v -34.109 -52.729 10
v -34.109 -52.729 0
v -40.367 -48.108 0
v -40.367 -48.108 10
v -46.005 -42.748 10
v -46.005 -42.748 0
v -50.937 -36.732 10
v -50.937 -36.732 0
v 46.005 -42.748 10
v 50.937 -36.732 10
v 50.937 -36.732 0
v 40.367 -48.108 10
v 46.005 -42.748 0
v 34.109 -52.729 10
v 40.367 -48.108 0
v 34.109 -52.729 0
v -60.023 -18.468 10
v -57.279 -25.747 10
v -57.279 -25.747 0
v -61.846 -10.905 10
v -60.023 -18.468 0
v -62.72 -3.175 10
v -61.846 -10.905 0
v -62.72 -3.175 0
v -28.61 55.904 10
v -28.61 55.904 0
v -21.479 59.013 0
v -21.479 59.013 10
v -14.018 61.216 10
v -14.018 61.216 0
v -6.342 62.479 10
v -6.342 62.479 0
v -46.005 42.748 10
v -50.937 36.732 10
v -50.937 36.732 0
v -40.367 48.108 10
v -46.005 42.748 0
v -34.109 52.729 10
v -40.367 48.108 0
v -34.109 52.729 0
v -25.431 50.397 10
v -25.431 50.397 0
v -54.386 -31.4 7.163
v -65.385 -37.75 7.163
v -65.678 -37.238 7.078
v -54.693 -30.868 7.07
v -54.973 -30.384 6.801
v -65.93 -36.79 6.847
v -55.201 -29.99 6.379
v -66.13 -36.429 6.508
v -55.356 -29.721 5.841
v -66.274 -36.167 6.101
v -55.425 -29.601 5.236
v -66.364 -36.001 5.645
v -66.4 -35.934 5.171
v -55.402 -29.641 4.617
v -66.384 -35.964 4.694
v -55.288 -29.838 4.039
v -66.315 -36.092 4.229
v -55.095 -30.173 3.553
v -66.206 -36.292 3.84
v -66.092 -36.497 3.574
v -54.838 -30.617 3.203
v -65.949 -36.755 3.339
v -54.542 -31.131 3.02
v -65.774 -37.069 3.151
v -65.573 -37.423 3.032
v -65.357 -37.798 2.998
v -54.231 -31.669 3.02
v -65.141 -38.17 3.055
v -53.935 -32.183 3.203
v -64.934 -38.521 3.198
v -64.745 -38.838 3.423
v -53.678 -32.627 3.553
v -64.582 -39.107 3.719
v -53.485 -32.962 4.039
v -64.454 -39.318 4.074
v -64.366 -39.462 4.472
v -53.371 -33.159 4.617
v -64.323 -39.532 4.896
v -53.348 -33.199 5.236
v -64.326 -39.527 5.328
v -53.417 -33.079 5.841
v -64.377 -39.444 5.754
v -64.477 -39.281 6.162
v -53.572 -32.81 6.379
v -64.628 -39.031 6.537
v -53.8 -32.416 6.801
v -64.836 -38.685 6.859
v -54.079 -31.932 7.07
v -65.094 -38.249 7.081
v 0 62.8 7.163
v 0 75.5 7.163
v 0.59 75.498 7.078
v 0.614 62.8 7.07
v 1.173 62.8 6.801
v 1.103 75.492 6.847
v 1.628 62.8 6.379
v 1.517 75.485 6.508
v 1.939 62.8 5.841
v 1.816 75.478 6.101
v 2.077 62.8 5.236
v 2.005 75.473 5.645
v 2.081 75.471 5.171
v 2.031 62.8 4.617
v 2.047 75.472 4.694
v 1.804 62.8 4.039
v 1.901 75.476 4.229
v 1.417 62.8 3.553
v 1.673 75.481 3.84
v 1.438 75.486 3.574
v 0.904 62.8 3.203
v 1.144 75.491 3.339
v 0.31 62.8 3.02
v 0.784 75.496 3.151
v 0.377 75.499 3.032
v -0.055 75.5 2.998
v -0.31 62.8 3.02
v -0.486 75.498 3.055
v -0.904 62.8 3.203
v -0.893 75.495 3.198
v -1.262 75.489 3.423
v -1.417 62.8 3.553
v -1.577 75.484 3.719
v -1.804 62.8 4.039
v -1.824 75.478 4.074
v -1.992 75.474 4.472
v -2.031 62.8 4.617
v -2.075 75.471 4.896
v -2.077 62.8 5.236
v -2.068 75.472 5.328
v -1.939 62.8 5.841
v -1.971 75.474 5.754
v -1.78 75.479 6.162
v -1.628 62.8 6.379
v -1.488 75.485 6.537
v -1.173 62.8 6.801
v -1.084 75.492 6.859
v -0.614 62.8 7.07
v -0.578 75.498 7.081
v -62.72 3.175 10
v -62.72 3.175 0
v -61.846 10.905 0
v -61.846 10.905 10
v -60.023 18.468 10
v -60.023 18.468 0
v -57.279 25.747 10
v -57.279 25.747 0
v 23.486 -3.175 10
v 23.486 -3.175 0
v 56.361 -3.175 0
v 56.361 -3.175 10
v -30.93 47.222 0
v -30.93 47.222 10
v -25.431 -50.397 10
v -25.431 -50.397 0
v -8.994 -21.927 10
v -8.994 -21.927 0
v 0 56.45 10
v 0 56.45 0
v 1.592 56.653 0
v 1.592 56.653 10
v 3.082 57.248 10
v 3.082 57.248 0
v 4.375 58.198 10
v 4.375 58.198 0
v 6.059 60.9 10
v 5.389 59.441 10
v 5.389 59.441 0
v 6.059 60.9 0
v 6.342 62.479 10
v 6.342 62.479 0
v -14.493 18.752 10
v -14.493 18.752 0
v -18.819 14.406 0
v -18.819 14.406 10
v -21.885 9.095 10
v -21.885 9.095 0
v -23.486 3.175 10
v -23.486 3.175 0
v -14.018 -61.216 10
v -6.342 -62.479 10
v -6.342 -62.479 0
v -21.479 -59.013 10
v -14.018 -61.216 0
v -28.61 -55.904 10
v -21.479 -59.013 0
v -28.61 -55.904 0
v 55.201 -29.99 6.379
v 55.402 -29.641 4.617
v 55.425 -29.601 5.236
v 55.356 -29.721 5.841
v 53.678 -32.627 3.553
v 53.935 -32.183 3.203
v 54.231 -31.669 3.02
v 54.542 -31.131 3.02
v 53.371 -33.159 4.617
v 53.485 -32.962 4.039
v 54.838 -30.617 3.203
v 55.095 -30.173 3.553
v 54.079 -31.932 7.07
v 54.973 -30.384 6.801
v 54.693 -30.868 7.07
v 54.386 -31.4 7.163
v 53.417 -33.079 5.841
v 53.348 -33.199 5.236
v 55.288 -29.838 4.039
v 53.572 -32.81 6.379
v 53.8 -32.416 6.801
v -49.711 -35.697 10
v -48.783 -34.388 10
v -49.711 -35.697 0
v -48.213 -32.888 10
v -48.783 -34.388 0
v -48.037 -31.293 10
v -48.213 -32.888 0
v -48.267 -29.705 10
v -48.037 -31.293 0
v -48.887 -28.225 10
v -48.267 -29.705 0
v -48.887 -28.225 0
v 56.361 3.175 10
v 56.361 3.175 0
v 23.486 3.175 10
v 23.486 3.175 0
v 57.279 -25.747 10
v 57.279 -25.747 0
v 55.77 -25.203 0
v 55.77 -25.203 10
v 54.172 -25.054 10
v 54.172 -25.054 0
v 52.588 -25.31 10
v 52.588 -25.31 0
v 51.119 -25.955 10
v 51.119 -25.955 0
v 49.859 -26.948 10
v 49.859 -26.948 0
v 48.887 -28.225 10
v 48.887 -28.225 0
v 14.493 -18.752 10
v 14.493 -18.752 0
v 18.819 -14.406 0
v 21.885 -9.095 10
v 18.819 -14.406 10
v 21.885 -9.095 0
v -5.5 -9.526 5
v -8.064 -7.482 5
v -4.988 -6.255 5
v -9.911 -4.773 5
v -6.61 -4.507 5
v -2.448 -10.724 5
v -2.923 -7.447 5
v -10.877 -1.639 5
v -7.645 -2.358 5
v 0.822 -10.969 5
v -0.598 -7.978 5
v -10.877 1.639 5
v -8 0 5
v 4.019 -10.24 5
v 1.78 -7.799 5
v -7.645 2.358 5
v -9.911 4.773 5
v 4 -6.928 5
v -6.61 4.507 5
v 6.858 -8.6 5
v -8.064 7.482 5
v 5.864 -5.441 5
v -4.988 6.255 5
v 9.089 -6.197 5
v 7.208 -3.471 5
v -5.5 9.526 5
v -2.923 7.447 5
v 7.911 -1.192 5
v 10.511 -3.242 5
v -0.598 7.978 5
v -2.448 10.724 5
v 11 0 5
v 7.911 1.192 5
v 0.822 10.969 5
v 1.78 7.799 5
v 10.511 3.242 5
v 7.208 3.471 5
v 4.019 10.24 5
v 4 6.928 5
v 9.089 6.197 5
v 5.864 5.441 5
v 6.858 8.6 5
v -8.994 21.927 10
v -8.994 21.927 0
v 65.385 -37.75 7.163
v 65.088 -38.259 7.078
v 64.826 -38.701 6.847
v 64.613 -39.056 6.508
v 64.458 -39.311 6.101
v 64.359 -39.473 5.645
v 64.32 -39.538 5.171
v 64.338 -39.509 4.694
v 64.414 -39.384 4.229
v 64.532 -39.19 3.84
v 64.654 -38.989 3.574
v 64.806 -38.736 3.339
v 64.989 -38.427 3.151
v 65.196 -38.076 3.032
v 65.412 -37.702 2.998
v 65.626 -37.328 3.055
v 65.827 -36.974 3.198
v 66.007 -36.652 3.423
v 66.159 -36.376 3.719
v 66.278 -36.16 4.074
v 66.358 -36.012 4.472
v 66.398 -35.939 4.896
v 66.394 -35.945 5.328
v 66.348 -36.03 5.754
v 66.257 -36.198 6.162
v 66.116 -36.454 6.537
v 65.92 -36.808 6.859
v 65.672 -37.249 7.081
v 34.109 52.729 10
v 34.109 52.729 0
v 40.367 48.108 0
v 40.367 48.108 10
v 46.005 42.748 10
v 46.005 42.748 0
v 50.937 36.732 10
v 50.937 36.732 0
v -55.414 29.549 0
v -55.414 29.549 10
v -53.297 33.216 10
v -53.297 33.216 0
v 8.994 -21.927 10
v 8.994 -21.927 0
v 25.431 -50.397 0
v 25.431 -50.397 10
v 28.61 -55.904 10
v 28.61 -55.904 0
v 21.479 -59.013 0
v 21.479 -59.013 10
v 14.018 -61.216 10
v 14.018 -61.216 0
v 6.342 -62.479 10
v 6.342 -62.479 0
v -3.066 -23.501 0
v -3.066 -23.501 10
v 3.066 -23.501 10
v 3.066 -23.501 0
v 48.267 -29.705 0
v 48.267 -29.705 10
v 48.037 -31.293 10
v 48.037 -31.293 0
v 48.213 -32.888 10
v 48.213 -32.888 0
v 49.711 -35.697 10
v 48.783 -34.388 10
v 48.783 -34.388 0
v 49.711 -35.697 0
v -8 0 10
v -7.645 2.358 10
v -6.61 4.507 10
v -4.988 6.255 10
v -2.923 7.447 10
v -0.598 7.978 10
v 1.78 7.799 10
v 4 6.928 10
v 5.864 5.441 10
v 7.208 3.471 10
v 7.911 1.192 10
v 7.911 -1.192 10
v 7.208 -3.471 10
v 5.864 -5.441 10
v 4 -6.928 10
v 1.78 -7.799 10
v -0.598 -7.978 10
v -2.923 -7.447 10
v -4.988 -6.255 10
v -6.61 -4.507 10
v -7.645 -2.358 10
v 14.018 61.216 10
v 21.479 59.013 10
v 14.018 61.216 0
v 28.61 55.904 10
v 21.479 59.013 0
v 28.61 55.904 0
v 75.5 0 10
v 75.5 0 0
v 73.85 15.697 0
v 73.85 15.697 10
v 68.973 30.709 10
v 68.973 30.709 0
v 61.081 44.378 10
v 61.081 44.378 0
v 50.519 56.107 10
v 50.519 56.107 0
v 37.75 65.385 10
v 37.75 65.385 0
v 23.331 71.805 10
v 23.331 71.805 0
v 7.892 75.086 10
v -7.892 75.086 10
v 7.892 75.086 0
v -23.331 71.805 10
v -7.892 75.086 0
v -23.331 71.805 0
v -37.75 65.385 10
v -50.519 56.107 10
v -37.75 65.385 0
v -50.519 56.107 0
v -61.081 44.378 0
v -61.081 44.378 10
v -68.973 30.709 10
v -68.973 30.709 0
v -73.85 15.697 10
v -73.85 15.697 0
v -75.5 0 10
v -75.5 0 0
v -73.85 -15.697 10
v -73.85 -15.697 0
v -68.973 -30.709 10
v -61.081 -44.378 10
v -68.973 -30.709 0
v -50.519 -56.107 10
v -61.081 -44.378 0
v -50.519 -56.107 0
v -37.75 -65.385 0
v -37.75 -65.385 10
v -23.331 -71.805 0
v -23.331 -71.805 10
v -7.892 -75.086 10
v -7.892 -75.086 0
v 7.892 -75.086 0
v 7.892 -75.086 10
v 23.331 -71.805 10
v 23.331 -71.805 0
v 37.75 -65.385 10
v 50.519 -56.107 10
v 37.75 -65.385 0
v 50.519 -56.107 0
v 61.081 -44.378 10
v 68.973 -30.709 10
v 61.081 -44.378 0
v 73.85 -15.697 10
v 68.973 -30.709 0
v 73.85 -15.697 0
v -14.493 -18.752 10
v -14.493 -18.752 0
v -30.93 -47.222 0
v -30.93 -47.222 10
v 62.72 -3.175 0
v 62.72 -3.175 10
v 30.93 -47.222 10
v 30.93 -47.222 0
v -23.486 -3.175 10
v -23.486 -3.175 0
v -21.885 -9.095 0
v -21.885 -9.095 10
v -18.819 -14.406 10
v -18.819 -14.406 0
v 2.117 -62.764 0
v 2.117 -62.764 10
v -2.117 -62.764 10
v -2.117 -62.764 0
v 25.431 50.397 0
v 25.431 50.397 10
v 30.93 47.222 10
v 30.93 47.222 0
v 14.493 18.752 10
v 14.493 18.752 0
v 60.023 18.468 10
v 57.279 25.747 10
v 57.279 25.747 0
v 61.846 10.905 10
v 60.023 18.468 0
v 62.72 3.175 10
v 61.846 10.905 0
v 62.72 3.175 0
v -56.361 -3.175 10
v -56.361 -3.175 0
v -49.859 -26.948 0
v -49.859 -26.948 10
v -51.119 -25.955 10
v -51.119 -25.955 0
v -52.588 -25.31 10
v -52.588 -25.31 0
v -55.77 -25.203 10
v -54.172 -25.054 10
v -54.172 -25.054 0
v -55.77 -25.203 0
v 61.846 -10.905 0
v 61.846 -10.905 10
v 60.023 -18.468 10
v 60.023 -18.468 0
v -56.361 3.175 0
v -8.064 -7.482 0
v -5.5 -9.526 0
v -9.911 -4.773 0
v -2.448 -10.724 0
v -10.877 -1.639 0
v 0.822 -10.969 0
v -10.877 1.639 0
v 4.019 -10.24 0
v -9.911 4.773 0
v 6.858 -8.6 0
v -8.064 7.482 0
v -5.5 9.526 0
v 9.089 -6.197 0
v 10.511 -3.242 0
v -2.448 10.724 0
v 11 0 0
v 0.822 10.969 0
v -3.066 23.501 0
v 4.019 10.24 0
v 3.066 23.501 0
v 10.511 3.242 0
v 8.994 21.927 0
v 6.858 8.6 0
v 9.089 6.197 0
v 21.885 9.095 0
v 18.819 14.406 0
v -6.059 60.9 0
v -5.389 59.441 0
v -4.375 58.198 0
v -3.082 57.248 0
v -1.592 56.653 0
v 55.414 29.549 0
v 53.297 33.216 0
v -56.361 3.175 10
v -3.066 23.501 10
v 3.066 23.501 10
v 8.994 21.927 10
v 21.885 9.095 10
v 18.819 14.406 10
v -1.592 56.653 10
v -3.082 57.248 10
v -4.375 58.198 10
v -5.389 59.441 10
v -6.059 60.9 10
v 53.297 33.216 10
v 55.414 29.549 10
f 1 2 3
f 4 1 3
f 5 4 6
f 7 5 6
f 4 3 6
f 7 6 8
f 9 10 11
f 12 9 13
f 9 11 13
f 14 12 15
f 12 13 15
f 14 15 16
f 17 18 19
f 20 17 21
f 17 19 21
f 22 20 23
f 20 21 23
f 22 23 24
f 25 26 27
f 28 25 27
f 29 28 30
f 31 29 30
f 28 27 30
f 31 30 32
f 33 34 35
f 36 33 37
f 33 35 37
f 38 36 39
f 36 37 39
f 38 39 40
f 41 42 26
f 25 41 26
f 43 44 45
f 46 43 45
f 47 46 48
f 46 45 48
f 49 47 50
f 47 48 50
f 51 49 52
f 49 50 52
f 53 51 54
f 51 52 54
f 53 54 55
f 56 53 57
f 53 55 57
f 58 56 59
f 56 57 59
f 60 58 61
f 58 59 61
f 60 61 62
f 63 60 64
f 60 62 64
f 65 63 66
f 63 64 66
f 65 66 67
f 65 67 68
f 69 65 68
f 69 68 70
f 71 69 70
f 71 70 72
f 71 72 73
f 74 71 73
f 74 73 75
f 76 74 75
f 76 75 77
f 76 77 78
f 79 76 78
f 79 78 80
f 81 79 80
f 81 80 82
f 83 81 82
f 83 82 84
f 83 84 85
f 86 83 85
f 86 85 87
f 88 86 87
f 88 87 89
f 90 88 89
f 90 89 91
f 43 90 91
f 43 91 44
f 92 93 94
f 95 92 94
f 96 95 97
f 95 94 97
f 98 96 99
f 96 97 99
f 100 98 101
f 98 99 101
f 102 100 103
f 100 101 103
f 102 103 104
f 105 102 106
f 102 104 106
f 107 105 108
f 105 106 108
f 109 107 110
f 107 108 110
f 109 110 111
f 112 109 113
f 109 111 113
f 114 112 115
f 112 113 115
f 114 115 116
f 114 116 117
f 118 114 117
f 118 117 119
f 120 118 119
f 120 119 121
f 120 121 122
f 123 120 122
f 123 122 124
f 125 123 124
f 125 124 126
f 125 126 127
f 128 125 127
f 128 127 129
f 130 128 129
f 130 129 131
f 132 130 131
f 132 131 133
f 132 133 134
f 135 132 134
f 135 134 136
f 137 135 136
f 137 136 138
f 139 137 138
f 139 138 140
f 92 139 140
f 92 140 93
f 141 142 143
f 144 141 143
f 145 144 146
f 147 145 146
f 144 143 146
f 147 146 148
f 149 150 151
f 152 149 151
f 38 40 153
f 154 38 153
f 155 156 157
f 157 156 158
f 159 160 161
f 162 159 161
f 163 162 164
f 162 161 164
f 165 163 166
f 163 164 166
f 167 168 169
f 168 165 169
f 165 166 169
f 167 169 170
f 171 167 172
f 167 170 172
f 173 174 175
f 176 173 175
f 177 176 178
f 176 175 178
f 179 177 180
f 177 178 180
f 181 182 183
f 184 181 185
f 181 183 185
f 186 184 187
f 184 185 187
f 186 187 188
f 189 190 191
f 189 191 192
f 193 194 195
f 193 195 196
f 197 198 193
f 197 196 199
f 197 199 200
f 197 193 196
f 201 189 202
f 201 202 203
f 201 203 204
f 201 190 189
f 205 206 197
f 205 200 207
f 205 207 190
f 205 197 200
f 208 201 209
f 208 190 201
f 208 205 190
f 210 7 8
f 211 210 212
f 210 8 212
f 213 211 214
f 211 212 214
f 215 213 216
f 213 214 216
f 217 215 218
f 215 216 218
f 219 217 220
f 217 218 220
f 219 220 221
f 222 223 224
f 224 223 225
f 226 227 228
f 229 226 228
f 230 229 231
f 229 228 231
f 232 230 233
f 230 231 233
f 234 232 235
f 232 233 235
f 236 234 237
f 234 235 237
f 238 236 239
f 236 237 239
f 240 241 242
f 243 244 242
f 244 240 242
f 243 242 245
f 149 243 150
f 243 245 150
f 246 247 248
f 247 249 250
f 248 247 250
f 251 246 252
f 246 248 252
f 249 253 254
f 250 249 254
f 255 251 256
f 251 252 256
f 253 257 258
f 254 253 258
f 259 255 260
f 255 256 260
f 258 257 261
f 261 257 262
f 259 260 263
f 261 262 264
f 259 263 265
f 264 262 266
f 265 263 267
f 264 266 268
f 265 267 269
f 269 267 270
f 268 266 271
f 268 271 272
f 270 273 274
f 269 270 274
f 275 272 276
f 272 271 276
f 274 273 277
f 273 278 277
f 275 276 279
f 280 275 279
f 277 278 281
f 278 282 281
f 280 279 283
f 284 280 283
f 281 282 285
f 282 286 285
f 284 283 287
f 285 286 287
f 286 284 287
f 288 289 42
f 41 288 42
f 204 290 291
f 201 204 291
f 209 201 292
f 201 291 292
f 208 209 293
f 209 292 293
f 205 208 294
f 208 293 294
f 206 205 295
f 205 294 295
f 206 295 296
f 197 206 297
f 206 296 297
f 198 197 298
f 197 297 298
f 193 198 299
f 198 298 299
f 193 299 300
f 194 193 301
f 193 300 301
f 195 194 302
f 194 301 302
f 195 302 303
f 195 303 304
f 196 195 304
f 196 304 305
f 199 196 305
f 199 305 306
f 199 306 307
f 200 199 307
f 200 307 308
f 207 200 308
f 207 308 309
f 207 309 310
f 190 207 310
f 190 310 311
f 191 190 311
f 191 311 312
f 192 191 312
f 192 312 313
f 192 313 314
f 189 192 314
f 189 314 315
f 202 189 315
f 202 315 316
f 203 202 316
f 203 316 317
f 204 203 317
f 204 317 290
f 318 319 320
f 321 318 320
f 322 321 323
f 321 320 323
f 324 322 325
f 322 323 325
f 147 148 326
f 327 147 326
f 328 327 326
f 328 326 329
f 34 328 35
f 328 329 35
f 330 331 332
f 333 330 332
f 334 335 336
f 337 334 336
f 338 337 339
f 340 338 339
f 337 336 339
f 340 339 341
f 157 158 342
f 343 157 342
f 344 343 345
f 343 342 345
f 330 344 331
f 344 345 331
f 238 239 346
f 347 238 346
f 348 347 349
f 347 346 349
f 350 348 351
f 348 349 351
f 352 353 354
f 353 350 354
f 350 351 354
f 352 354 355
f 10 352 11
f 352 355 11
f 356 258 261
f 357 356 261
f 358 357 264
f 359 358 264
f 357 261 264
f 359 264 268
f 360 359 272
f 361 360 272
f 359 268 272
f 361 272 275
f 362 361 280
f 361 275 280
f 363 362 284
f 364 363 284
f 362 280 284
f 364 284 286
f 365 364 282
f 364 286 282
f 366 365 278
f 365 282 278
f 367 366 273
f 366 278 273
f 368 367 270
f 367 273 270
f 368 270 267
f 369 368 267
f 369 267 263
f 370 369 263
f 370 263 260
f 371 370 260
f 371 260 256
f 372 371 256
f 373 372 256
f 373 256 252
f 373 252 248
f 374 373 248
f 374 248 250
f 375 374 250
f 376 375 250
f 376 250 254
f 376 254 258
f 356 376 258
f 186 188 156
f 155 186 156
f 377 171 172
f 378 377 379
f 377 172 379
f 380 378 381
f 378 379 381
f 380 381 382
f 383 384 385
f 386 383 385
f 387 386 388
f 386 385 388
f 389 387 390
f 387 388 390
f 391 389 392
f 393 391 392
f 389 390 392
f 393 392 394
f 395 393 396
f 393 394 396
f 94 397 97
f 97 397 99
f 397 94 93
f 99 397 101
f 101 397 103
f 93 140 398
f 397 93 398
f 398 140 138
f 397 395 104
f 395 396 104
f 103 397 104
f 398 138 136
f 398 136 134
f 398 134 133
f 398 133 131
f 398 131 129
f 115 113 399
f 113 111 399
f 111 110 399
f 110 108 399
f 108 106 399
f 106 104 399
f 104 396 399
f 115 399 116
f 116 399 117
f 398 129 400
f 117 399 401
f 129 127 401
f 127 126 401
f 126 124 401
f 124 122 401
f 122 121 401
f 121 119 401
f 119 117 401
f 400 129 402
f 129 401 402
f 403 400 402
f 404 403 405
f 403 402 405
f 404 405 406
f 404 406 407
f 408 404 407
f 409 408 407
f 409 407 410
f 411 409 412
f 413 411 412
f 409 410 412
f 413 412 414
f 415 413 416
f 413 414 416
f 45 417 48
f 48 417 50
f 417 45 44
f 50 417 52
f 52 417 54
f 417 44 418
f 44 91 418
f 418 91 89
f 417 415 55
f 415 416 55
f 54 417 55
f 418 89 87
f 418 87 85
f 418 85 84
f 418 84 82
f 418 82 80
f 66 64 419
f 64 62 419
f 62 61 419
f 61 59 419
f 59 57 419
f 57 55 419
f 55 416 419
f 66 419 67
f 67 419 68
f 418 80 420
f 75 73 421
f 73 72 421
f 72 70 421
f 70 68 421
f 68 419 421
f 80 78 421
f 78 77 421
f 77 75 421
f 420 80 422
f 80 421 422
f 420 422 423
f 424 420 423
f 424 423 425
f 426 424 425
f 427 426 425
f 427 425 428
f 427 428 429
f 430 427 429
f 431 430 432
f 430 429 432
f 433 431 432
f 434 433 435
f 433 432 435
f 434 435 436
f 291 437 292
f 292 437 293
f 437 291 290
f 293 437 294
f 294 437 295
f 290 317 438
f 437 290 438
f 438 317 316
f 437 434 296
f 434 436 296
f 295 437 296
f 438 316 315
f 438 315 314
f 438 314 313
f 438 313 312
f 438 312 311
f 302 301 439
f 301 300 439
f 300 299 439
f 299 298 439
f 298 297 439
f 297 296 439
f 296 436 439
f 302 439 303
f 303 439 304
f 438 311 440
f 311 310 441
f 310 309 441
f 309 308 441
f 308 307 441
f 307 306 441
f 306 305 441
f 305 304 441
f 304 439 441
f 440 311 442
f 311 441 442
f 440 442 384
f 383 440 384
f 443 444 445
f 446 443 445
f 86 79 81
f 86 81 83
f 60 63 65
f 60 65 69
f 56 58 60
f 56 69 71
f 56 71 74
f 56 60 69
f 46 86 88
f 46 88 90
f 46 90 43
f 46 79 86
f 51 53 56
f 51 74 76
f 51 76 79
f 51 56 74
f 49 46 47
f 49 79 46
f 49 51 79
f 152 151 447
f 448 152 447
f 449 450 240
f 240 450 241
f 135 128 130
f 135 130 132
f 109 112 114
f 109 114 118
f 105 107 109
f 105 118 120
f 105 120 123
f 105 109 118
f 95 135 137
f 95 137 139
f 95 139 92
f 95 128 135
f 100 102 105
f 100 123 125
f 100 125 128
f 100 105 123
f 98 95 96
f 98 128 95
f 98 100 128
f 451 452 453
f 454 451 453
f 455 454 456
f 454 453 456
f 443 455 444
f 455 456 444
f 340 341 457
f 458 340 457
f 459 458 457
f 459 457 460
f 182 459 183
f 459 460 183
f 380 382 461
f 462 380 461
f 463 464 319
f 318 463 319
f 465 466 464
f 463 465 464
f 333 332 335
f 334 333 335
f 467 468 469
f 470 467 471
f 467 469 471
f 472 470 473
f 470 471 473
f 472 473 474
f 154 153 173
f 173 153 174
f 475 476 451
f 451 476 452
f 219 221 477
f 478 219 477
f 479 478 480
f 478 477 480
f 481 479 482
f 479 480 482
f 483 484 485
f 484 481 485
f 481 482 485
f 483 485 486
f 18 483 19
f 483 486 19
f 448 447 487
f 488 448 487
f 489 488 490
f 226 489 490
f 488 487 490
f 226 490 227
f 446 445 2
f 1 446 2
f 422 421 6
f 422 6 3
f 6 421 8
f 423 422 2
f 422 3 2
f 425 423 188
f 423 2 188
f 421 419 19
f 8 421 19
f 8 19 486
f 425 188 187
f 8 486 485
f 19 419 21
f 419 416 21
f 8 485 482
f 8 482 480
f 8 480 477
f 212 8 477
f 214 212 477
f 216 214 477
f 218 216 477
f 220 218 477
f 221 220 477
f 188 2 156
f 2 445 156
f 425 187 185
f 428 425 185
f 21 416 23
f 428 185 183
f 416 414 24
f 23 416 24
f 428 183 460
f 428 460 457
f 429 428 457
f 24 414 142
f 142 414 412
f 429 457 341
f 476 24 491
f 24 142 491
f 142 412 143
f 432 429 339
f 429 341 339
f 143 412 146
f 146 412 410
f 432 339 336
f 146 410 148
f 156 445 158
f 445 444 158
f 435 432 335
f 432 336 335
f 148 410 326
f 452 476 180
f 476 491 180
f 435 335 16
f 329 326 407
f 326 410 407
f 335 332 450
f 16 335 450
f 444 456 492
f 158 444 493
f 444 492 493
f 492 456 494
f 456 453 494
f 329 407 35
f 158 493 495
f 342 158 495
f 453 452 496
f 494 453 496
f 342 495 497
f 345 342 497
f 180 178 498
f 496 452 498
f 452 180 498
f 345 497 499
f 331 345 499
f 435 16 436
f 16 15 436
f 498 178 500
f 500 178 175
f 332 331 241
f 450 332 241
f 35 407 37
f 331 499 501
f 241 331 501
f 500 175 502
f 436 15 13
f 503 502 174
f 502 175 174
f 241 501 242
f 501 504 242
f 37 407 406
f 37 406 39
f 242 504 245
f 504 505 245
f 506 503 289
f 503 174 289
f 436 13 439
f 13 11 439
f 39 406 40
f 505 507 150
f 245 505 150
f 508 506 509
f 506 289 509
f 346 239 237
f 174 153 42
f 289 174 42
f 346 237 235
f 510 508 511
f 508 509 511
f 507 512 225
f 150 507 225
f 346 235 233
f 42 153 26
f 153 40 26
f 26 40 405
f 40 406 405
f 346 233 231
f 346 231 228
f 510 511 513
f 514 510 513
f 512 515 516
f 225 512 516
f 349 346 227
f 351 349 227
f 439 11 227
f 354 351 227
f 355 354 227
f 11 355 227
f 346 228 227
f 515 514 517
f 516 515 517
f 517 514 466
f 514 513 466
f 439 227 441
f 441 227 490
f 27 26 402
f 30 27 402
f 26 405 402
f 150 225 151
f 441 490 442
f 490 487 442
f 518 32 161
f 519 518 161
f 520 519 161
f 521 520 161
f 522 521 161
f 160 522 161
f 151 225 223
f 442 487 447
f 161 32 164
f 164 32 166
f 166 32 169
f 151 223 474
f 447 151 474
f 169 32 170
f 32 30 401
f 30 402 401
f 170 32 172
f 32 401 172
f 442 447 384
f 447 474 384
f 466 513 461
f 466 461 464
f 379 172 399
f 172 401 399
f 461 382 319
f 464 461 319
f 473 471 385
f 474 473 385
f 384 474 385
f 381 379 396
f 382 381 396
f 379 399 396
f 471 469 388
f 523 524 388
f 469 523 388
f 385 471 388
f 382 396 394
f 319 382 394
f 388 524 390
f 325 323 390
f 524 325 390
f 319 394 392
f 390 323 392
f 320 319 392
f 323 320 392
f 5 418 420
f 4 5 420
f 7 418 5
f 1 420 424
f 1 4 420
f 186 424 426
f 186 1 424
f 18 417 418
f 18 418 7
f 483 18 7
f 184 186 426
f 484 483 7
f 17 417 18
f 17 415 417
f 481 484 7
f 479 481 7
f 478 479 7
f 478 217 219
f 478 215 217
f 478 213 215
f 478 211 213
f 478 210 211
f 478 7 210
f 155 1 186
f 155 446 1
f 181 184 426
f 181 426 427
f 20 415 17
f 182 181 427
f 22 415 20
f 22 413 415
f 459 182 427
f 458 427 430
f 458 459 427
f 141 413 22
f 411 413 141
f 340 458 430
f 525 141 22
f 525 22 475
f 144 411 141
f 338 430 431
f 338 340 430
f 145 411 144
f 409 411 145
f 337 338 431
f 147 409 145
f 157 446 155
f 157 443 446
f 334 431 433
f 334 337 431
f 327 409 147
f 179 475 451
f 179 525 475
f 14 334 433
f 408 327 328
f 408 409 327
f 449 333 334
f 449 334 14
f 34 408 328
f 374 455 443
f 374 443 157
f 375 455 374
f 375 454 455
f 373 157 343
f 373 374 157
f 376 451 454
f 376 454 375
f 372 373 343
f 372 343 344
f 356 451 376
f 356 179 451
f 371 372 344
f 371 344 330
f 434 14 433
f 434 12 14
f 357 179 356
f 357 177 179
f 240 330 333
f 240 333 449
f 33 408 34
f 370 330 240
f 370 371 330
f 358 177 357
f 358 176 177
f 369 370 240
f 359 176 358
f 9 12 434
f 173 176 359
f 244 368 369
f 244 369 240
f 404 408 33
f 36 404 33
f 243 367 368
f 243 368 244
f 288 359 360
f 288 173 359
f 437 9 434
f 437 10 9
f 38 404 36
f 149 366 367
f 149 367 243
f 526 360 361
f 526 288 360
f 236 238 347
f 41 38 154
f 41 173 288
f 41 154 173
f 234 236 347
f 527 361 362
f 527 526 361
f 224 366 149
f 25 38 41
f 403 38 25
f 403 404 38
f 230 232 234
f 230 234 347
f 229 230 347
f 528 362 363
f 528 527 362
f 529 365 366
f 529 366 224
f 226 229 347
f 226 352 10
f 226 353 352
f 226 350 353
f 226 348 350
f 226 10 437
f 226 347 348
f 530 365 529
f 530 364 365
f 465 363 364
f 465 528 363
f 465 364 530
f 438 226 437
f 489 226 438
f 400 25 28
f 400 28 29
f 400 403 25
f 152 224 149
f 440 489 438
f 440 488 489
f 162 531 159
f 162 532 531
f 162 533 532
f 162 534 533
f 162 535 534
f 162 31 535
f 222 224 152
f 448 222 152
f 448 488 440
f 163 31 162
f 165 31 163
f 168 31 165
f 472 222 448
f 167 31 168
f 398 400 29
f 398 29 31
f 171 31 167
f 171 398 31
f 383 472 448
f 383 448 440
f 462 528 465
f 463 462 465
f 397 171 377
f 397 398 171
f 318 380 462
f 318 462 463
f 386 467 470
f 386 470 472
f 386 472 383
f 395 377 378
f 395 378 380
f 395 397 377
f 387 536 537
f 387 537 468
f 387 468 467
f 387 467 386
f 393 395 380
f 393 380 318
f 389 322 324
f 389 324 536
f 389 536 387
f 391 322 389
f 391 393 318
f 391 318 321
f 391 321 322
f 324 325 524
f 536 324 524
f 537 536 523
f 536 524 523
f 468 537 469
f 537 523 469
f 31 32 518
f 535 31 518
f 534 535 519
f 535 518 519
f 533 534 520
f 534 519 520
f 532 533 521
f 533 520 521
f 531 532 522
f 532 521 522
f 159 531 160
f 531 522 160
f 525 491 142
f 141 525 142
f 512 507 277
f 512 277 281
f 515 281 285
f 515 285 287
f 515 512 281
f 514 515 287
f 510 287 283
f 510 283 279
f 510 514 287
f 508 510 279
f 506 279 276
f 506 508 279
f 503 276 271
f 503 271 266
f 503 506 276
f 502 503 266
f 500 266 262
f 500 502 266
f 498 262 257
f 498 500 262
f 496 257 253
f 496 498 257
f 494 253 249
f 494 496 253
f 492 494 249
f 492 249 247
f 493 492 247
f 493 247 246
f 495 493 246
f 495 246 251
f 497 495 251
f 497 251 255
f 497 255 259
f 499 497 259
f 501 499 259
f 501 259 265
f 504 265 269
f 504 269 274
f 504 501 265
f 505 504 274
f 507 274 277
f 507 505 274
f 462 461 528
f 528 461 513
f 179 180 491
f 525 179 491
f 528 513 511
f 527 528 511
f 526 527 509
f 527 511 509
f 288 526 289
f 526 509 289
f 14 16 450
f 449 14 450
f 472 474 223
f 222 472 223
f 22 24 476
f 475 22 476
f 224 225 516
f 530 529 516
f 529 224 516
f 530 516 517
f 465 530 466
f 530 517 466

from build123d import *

# Parameters (mm, degrees)
SKETCH1_R           = 75.5
BOSS_EXTRUDE1_DEPTH = 10
CUT_EXTRUDE1_START  = -10
SKETCH2_R           = 11
CUT_EXTRUDE1_DEPTH  = 5
SKETCH3_R           = 8
CUT_EXTRUDE2_DEPTH  = 107.890130508
SKETCH5_R           = 2.0828
CUT_EXTRUDE4_DEPTH  = 12.7
CIRPATTERN2_COUNT   = 3
CUT_EXTRUDE5_DEPTH  = 108.240384344
CIRPATTERN3_COUNT   = 6
CUT_EXTRUDE6_DEPTH  = 108.240384344
CIRPATTERN4_COUNT   = 3


with BuildPart() as part:
    # Sketch1 → Boss-Extrude1 (new body)
    with BuildSketch(Plane.XY):
        Circle(SKETCH1_R)
    extrude(amount=BOSS_EXTRUDE1_DEPTH)

    # Sketch2 → Cut-Extrude1 (cut)
    with BuildSketch(Plane.XY.offset(10).offset(CUT_EXTRUDE1_START)):
        Circle(SKETCH2_R)
    extrude(amount=CUT_EXTRUDE1_DEPTH, mode=Mode.SUBTRACT)

    # Sketch3 → Cut-Extrude2 (cut, through all)
    with BuildSketch(Plane(origin=(0, 0, 5), x_dir=(-1, 0, 0), z_dir=(0, 0, -1))):
        Circle(SKETCH3_R)
    extrude(amount=-CUT_EXTRUDE2_DEPTH, mode=Mode.SUBTRACT)

    # Sketch5 → Cut-Extrude4 (cut)
    with BuildSketch(Plane(origin=(0, 75.5, 0), x_dir=(1, 0, 0), z_dir=(0, 1, 0))):
        with Locations(Location((0, -5.08, 0), (0, 0, 270))):
            Circle(SKETCH5_R)
    cut_extrude4 = extrude(amount=-CUT_EXTRUDE4_DEPTH, mode=Mode.SUBTRACT)

    # CirPattern2: Cut-Extrude4 ×3 about axis
    cirpattern2_axis = Axis((0, 0, 0), (0, 0, 1))
    for i in range(1, CIRPATTERN2_COUNT):
        add(cut_extrude4.rotate(cirpattern2_axis, i * 360 / CIRPATTERN2_COUNT), mode=Mode.SUBTRACT)

    # Sketch6 → Cut-Extrude5 (cut, through all)
    with BuildSketch(Plane(origin=(0, 0, 0), x_dir=(-1, 0, 0), z_dir=(0, 0, -1))):
        with BuildLine():
            Line((-25.430689936, 50.397247041), (-8.993552206, 21.927289361))
            ThreePointArc((-8.993552206, 21.927289361), (0, 23.7), (8.993552206, 21.927289361))
            Line((8.993552206, 21.927289361), (25.430689936, 50.397247041))
            ThreePointArc((25.430689936, 50.397247041), (13.070537583, 54.915968054), (3.6e-08, 56.45))
            ThreePointArc((3.6e-08, 56.45), (-13.070537548, 54.915968062), (-25.430689936, 50.397247041))
        make_face()
        with BuildLine():
            ThreePointArc((3.6e-08, 56.45), (13.070537583, 54.915968054), (25.430689936, 50.397247041))
            Line((25.430689936, 50.397247041), (28.61021379, 55.9043439))
            ThreePointArc((28.61021379, 55.9043439), (17.78253642, 60.229738489), (6.341879371, 62.478960987))
            ThreePointArc((6.341879371, 62.478960987), (4.375151569, 58.197766982), (3.6e-08, 56.45))
        make_face()
        with BuildLine():
            Line((-28.61021379, 55.9043439), (-25.430689936, 50.397247041))
            ThreePointArc((-25.430689936, 50.397247041), (-13.070537548, 54.915968062), (3.6e-08, 56.45))
            ThreePointArc((3.6e-08, 56.45), (-4.375151542, 58.197766957), (-6.341879371, 62.478960987))
            ThreePointArc((-6.341879371, 62.478960987), (-17.78253642, 60.229738489), (-28.61021379, 55.9043439))
        make_face()
    cut_extrude5 = extrude(amount=-CUT_EXTRUDE5_DEPTH, mode=Mode.SUBTRACT)

    # CirPattern3: Cut-Extrude5 ×6 about axis
    cirpattern3_axis = Axis((0, 0, 0), (0, 0, 1))
    for i in range(1, CIRPATTERN3_COUNT):
        add(cut_extrude5.rotate(cirpattern3_axis, i * 360 / CIRPATTERN3_COUNT), mode=Mode.SUBTRACT)

    # Sketch8 → Cut-Extrude6 (cut, through all)
    with BuildSketch(Plane(origin=(0, 0, 0), x_dir=(-1, 0, 0), z_dir=(0, 0, -1))):
        with BuildLine():
            ThreePointArc((-57.279307102, 25.747251851), (-48.887134044, 28.225), (-50.937427732, 36.731709136))
            ThreePointArc((-50.937427732, 36.731709136), (-54.386395358, 31.4), (-57.279307102, 25.747251851))
        make_face()
    cut_extrude6 = extrude(amount=-CUT_EXTRUDE6_DEPTH, mode=Mode.SUBTRACT)

    # CirPattern4: Cut-Extrude6 ×3 about axis
    cirpattern4_axis = Axis((0, 0, 5), (0, 0, -1))
    for i in range(1, CIRPATTERN4_COUNT):
        add(cut_extrude6.rotate(cirpattern4_axis, i * 360 / CIRPATTERN4_COUNT), mode=Mode.SUBTRACT)


solid = part.part
